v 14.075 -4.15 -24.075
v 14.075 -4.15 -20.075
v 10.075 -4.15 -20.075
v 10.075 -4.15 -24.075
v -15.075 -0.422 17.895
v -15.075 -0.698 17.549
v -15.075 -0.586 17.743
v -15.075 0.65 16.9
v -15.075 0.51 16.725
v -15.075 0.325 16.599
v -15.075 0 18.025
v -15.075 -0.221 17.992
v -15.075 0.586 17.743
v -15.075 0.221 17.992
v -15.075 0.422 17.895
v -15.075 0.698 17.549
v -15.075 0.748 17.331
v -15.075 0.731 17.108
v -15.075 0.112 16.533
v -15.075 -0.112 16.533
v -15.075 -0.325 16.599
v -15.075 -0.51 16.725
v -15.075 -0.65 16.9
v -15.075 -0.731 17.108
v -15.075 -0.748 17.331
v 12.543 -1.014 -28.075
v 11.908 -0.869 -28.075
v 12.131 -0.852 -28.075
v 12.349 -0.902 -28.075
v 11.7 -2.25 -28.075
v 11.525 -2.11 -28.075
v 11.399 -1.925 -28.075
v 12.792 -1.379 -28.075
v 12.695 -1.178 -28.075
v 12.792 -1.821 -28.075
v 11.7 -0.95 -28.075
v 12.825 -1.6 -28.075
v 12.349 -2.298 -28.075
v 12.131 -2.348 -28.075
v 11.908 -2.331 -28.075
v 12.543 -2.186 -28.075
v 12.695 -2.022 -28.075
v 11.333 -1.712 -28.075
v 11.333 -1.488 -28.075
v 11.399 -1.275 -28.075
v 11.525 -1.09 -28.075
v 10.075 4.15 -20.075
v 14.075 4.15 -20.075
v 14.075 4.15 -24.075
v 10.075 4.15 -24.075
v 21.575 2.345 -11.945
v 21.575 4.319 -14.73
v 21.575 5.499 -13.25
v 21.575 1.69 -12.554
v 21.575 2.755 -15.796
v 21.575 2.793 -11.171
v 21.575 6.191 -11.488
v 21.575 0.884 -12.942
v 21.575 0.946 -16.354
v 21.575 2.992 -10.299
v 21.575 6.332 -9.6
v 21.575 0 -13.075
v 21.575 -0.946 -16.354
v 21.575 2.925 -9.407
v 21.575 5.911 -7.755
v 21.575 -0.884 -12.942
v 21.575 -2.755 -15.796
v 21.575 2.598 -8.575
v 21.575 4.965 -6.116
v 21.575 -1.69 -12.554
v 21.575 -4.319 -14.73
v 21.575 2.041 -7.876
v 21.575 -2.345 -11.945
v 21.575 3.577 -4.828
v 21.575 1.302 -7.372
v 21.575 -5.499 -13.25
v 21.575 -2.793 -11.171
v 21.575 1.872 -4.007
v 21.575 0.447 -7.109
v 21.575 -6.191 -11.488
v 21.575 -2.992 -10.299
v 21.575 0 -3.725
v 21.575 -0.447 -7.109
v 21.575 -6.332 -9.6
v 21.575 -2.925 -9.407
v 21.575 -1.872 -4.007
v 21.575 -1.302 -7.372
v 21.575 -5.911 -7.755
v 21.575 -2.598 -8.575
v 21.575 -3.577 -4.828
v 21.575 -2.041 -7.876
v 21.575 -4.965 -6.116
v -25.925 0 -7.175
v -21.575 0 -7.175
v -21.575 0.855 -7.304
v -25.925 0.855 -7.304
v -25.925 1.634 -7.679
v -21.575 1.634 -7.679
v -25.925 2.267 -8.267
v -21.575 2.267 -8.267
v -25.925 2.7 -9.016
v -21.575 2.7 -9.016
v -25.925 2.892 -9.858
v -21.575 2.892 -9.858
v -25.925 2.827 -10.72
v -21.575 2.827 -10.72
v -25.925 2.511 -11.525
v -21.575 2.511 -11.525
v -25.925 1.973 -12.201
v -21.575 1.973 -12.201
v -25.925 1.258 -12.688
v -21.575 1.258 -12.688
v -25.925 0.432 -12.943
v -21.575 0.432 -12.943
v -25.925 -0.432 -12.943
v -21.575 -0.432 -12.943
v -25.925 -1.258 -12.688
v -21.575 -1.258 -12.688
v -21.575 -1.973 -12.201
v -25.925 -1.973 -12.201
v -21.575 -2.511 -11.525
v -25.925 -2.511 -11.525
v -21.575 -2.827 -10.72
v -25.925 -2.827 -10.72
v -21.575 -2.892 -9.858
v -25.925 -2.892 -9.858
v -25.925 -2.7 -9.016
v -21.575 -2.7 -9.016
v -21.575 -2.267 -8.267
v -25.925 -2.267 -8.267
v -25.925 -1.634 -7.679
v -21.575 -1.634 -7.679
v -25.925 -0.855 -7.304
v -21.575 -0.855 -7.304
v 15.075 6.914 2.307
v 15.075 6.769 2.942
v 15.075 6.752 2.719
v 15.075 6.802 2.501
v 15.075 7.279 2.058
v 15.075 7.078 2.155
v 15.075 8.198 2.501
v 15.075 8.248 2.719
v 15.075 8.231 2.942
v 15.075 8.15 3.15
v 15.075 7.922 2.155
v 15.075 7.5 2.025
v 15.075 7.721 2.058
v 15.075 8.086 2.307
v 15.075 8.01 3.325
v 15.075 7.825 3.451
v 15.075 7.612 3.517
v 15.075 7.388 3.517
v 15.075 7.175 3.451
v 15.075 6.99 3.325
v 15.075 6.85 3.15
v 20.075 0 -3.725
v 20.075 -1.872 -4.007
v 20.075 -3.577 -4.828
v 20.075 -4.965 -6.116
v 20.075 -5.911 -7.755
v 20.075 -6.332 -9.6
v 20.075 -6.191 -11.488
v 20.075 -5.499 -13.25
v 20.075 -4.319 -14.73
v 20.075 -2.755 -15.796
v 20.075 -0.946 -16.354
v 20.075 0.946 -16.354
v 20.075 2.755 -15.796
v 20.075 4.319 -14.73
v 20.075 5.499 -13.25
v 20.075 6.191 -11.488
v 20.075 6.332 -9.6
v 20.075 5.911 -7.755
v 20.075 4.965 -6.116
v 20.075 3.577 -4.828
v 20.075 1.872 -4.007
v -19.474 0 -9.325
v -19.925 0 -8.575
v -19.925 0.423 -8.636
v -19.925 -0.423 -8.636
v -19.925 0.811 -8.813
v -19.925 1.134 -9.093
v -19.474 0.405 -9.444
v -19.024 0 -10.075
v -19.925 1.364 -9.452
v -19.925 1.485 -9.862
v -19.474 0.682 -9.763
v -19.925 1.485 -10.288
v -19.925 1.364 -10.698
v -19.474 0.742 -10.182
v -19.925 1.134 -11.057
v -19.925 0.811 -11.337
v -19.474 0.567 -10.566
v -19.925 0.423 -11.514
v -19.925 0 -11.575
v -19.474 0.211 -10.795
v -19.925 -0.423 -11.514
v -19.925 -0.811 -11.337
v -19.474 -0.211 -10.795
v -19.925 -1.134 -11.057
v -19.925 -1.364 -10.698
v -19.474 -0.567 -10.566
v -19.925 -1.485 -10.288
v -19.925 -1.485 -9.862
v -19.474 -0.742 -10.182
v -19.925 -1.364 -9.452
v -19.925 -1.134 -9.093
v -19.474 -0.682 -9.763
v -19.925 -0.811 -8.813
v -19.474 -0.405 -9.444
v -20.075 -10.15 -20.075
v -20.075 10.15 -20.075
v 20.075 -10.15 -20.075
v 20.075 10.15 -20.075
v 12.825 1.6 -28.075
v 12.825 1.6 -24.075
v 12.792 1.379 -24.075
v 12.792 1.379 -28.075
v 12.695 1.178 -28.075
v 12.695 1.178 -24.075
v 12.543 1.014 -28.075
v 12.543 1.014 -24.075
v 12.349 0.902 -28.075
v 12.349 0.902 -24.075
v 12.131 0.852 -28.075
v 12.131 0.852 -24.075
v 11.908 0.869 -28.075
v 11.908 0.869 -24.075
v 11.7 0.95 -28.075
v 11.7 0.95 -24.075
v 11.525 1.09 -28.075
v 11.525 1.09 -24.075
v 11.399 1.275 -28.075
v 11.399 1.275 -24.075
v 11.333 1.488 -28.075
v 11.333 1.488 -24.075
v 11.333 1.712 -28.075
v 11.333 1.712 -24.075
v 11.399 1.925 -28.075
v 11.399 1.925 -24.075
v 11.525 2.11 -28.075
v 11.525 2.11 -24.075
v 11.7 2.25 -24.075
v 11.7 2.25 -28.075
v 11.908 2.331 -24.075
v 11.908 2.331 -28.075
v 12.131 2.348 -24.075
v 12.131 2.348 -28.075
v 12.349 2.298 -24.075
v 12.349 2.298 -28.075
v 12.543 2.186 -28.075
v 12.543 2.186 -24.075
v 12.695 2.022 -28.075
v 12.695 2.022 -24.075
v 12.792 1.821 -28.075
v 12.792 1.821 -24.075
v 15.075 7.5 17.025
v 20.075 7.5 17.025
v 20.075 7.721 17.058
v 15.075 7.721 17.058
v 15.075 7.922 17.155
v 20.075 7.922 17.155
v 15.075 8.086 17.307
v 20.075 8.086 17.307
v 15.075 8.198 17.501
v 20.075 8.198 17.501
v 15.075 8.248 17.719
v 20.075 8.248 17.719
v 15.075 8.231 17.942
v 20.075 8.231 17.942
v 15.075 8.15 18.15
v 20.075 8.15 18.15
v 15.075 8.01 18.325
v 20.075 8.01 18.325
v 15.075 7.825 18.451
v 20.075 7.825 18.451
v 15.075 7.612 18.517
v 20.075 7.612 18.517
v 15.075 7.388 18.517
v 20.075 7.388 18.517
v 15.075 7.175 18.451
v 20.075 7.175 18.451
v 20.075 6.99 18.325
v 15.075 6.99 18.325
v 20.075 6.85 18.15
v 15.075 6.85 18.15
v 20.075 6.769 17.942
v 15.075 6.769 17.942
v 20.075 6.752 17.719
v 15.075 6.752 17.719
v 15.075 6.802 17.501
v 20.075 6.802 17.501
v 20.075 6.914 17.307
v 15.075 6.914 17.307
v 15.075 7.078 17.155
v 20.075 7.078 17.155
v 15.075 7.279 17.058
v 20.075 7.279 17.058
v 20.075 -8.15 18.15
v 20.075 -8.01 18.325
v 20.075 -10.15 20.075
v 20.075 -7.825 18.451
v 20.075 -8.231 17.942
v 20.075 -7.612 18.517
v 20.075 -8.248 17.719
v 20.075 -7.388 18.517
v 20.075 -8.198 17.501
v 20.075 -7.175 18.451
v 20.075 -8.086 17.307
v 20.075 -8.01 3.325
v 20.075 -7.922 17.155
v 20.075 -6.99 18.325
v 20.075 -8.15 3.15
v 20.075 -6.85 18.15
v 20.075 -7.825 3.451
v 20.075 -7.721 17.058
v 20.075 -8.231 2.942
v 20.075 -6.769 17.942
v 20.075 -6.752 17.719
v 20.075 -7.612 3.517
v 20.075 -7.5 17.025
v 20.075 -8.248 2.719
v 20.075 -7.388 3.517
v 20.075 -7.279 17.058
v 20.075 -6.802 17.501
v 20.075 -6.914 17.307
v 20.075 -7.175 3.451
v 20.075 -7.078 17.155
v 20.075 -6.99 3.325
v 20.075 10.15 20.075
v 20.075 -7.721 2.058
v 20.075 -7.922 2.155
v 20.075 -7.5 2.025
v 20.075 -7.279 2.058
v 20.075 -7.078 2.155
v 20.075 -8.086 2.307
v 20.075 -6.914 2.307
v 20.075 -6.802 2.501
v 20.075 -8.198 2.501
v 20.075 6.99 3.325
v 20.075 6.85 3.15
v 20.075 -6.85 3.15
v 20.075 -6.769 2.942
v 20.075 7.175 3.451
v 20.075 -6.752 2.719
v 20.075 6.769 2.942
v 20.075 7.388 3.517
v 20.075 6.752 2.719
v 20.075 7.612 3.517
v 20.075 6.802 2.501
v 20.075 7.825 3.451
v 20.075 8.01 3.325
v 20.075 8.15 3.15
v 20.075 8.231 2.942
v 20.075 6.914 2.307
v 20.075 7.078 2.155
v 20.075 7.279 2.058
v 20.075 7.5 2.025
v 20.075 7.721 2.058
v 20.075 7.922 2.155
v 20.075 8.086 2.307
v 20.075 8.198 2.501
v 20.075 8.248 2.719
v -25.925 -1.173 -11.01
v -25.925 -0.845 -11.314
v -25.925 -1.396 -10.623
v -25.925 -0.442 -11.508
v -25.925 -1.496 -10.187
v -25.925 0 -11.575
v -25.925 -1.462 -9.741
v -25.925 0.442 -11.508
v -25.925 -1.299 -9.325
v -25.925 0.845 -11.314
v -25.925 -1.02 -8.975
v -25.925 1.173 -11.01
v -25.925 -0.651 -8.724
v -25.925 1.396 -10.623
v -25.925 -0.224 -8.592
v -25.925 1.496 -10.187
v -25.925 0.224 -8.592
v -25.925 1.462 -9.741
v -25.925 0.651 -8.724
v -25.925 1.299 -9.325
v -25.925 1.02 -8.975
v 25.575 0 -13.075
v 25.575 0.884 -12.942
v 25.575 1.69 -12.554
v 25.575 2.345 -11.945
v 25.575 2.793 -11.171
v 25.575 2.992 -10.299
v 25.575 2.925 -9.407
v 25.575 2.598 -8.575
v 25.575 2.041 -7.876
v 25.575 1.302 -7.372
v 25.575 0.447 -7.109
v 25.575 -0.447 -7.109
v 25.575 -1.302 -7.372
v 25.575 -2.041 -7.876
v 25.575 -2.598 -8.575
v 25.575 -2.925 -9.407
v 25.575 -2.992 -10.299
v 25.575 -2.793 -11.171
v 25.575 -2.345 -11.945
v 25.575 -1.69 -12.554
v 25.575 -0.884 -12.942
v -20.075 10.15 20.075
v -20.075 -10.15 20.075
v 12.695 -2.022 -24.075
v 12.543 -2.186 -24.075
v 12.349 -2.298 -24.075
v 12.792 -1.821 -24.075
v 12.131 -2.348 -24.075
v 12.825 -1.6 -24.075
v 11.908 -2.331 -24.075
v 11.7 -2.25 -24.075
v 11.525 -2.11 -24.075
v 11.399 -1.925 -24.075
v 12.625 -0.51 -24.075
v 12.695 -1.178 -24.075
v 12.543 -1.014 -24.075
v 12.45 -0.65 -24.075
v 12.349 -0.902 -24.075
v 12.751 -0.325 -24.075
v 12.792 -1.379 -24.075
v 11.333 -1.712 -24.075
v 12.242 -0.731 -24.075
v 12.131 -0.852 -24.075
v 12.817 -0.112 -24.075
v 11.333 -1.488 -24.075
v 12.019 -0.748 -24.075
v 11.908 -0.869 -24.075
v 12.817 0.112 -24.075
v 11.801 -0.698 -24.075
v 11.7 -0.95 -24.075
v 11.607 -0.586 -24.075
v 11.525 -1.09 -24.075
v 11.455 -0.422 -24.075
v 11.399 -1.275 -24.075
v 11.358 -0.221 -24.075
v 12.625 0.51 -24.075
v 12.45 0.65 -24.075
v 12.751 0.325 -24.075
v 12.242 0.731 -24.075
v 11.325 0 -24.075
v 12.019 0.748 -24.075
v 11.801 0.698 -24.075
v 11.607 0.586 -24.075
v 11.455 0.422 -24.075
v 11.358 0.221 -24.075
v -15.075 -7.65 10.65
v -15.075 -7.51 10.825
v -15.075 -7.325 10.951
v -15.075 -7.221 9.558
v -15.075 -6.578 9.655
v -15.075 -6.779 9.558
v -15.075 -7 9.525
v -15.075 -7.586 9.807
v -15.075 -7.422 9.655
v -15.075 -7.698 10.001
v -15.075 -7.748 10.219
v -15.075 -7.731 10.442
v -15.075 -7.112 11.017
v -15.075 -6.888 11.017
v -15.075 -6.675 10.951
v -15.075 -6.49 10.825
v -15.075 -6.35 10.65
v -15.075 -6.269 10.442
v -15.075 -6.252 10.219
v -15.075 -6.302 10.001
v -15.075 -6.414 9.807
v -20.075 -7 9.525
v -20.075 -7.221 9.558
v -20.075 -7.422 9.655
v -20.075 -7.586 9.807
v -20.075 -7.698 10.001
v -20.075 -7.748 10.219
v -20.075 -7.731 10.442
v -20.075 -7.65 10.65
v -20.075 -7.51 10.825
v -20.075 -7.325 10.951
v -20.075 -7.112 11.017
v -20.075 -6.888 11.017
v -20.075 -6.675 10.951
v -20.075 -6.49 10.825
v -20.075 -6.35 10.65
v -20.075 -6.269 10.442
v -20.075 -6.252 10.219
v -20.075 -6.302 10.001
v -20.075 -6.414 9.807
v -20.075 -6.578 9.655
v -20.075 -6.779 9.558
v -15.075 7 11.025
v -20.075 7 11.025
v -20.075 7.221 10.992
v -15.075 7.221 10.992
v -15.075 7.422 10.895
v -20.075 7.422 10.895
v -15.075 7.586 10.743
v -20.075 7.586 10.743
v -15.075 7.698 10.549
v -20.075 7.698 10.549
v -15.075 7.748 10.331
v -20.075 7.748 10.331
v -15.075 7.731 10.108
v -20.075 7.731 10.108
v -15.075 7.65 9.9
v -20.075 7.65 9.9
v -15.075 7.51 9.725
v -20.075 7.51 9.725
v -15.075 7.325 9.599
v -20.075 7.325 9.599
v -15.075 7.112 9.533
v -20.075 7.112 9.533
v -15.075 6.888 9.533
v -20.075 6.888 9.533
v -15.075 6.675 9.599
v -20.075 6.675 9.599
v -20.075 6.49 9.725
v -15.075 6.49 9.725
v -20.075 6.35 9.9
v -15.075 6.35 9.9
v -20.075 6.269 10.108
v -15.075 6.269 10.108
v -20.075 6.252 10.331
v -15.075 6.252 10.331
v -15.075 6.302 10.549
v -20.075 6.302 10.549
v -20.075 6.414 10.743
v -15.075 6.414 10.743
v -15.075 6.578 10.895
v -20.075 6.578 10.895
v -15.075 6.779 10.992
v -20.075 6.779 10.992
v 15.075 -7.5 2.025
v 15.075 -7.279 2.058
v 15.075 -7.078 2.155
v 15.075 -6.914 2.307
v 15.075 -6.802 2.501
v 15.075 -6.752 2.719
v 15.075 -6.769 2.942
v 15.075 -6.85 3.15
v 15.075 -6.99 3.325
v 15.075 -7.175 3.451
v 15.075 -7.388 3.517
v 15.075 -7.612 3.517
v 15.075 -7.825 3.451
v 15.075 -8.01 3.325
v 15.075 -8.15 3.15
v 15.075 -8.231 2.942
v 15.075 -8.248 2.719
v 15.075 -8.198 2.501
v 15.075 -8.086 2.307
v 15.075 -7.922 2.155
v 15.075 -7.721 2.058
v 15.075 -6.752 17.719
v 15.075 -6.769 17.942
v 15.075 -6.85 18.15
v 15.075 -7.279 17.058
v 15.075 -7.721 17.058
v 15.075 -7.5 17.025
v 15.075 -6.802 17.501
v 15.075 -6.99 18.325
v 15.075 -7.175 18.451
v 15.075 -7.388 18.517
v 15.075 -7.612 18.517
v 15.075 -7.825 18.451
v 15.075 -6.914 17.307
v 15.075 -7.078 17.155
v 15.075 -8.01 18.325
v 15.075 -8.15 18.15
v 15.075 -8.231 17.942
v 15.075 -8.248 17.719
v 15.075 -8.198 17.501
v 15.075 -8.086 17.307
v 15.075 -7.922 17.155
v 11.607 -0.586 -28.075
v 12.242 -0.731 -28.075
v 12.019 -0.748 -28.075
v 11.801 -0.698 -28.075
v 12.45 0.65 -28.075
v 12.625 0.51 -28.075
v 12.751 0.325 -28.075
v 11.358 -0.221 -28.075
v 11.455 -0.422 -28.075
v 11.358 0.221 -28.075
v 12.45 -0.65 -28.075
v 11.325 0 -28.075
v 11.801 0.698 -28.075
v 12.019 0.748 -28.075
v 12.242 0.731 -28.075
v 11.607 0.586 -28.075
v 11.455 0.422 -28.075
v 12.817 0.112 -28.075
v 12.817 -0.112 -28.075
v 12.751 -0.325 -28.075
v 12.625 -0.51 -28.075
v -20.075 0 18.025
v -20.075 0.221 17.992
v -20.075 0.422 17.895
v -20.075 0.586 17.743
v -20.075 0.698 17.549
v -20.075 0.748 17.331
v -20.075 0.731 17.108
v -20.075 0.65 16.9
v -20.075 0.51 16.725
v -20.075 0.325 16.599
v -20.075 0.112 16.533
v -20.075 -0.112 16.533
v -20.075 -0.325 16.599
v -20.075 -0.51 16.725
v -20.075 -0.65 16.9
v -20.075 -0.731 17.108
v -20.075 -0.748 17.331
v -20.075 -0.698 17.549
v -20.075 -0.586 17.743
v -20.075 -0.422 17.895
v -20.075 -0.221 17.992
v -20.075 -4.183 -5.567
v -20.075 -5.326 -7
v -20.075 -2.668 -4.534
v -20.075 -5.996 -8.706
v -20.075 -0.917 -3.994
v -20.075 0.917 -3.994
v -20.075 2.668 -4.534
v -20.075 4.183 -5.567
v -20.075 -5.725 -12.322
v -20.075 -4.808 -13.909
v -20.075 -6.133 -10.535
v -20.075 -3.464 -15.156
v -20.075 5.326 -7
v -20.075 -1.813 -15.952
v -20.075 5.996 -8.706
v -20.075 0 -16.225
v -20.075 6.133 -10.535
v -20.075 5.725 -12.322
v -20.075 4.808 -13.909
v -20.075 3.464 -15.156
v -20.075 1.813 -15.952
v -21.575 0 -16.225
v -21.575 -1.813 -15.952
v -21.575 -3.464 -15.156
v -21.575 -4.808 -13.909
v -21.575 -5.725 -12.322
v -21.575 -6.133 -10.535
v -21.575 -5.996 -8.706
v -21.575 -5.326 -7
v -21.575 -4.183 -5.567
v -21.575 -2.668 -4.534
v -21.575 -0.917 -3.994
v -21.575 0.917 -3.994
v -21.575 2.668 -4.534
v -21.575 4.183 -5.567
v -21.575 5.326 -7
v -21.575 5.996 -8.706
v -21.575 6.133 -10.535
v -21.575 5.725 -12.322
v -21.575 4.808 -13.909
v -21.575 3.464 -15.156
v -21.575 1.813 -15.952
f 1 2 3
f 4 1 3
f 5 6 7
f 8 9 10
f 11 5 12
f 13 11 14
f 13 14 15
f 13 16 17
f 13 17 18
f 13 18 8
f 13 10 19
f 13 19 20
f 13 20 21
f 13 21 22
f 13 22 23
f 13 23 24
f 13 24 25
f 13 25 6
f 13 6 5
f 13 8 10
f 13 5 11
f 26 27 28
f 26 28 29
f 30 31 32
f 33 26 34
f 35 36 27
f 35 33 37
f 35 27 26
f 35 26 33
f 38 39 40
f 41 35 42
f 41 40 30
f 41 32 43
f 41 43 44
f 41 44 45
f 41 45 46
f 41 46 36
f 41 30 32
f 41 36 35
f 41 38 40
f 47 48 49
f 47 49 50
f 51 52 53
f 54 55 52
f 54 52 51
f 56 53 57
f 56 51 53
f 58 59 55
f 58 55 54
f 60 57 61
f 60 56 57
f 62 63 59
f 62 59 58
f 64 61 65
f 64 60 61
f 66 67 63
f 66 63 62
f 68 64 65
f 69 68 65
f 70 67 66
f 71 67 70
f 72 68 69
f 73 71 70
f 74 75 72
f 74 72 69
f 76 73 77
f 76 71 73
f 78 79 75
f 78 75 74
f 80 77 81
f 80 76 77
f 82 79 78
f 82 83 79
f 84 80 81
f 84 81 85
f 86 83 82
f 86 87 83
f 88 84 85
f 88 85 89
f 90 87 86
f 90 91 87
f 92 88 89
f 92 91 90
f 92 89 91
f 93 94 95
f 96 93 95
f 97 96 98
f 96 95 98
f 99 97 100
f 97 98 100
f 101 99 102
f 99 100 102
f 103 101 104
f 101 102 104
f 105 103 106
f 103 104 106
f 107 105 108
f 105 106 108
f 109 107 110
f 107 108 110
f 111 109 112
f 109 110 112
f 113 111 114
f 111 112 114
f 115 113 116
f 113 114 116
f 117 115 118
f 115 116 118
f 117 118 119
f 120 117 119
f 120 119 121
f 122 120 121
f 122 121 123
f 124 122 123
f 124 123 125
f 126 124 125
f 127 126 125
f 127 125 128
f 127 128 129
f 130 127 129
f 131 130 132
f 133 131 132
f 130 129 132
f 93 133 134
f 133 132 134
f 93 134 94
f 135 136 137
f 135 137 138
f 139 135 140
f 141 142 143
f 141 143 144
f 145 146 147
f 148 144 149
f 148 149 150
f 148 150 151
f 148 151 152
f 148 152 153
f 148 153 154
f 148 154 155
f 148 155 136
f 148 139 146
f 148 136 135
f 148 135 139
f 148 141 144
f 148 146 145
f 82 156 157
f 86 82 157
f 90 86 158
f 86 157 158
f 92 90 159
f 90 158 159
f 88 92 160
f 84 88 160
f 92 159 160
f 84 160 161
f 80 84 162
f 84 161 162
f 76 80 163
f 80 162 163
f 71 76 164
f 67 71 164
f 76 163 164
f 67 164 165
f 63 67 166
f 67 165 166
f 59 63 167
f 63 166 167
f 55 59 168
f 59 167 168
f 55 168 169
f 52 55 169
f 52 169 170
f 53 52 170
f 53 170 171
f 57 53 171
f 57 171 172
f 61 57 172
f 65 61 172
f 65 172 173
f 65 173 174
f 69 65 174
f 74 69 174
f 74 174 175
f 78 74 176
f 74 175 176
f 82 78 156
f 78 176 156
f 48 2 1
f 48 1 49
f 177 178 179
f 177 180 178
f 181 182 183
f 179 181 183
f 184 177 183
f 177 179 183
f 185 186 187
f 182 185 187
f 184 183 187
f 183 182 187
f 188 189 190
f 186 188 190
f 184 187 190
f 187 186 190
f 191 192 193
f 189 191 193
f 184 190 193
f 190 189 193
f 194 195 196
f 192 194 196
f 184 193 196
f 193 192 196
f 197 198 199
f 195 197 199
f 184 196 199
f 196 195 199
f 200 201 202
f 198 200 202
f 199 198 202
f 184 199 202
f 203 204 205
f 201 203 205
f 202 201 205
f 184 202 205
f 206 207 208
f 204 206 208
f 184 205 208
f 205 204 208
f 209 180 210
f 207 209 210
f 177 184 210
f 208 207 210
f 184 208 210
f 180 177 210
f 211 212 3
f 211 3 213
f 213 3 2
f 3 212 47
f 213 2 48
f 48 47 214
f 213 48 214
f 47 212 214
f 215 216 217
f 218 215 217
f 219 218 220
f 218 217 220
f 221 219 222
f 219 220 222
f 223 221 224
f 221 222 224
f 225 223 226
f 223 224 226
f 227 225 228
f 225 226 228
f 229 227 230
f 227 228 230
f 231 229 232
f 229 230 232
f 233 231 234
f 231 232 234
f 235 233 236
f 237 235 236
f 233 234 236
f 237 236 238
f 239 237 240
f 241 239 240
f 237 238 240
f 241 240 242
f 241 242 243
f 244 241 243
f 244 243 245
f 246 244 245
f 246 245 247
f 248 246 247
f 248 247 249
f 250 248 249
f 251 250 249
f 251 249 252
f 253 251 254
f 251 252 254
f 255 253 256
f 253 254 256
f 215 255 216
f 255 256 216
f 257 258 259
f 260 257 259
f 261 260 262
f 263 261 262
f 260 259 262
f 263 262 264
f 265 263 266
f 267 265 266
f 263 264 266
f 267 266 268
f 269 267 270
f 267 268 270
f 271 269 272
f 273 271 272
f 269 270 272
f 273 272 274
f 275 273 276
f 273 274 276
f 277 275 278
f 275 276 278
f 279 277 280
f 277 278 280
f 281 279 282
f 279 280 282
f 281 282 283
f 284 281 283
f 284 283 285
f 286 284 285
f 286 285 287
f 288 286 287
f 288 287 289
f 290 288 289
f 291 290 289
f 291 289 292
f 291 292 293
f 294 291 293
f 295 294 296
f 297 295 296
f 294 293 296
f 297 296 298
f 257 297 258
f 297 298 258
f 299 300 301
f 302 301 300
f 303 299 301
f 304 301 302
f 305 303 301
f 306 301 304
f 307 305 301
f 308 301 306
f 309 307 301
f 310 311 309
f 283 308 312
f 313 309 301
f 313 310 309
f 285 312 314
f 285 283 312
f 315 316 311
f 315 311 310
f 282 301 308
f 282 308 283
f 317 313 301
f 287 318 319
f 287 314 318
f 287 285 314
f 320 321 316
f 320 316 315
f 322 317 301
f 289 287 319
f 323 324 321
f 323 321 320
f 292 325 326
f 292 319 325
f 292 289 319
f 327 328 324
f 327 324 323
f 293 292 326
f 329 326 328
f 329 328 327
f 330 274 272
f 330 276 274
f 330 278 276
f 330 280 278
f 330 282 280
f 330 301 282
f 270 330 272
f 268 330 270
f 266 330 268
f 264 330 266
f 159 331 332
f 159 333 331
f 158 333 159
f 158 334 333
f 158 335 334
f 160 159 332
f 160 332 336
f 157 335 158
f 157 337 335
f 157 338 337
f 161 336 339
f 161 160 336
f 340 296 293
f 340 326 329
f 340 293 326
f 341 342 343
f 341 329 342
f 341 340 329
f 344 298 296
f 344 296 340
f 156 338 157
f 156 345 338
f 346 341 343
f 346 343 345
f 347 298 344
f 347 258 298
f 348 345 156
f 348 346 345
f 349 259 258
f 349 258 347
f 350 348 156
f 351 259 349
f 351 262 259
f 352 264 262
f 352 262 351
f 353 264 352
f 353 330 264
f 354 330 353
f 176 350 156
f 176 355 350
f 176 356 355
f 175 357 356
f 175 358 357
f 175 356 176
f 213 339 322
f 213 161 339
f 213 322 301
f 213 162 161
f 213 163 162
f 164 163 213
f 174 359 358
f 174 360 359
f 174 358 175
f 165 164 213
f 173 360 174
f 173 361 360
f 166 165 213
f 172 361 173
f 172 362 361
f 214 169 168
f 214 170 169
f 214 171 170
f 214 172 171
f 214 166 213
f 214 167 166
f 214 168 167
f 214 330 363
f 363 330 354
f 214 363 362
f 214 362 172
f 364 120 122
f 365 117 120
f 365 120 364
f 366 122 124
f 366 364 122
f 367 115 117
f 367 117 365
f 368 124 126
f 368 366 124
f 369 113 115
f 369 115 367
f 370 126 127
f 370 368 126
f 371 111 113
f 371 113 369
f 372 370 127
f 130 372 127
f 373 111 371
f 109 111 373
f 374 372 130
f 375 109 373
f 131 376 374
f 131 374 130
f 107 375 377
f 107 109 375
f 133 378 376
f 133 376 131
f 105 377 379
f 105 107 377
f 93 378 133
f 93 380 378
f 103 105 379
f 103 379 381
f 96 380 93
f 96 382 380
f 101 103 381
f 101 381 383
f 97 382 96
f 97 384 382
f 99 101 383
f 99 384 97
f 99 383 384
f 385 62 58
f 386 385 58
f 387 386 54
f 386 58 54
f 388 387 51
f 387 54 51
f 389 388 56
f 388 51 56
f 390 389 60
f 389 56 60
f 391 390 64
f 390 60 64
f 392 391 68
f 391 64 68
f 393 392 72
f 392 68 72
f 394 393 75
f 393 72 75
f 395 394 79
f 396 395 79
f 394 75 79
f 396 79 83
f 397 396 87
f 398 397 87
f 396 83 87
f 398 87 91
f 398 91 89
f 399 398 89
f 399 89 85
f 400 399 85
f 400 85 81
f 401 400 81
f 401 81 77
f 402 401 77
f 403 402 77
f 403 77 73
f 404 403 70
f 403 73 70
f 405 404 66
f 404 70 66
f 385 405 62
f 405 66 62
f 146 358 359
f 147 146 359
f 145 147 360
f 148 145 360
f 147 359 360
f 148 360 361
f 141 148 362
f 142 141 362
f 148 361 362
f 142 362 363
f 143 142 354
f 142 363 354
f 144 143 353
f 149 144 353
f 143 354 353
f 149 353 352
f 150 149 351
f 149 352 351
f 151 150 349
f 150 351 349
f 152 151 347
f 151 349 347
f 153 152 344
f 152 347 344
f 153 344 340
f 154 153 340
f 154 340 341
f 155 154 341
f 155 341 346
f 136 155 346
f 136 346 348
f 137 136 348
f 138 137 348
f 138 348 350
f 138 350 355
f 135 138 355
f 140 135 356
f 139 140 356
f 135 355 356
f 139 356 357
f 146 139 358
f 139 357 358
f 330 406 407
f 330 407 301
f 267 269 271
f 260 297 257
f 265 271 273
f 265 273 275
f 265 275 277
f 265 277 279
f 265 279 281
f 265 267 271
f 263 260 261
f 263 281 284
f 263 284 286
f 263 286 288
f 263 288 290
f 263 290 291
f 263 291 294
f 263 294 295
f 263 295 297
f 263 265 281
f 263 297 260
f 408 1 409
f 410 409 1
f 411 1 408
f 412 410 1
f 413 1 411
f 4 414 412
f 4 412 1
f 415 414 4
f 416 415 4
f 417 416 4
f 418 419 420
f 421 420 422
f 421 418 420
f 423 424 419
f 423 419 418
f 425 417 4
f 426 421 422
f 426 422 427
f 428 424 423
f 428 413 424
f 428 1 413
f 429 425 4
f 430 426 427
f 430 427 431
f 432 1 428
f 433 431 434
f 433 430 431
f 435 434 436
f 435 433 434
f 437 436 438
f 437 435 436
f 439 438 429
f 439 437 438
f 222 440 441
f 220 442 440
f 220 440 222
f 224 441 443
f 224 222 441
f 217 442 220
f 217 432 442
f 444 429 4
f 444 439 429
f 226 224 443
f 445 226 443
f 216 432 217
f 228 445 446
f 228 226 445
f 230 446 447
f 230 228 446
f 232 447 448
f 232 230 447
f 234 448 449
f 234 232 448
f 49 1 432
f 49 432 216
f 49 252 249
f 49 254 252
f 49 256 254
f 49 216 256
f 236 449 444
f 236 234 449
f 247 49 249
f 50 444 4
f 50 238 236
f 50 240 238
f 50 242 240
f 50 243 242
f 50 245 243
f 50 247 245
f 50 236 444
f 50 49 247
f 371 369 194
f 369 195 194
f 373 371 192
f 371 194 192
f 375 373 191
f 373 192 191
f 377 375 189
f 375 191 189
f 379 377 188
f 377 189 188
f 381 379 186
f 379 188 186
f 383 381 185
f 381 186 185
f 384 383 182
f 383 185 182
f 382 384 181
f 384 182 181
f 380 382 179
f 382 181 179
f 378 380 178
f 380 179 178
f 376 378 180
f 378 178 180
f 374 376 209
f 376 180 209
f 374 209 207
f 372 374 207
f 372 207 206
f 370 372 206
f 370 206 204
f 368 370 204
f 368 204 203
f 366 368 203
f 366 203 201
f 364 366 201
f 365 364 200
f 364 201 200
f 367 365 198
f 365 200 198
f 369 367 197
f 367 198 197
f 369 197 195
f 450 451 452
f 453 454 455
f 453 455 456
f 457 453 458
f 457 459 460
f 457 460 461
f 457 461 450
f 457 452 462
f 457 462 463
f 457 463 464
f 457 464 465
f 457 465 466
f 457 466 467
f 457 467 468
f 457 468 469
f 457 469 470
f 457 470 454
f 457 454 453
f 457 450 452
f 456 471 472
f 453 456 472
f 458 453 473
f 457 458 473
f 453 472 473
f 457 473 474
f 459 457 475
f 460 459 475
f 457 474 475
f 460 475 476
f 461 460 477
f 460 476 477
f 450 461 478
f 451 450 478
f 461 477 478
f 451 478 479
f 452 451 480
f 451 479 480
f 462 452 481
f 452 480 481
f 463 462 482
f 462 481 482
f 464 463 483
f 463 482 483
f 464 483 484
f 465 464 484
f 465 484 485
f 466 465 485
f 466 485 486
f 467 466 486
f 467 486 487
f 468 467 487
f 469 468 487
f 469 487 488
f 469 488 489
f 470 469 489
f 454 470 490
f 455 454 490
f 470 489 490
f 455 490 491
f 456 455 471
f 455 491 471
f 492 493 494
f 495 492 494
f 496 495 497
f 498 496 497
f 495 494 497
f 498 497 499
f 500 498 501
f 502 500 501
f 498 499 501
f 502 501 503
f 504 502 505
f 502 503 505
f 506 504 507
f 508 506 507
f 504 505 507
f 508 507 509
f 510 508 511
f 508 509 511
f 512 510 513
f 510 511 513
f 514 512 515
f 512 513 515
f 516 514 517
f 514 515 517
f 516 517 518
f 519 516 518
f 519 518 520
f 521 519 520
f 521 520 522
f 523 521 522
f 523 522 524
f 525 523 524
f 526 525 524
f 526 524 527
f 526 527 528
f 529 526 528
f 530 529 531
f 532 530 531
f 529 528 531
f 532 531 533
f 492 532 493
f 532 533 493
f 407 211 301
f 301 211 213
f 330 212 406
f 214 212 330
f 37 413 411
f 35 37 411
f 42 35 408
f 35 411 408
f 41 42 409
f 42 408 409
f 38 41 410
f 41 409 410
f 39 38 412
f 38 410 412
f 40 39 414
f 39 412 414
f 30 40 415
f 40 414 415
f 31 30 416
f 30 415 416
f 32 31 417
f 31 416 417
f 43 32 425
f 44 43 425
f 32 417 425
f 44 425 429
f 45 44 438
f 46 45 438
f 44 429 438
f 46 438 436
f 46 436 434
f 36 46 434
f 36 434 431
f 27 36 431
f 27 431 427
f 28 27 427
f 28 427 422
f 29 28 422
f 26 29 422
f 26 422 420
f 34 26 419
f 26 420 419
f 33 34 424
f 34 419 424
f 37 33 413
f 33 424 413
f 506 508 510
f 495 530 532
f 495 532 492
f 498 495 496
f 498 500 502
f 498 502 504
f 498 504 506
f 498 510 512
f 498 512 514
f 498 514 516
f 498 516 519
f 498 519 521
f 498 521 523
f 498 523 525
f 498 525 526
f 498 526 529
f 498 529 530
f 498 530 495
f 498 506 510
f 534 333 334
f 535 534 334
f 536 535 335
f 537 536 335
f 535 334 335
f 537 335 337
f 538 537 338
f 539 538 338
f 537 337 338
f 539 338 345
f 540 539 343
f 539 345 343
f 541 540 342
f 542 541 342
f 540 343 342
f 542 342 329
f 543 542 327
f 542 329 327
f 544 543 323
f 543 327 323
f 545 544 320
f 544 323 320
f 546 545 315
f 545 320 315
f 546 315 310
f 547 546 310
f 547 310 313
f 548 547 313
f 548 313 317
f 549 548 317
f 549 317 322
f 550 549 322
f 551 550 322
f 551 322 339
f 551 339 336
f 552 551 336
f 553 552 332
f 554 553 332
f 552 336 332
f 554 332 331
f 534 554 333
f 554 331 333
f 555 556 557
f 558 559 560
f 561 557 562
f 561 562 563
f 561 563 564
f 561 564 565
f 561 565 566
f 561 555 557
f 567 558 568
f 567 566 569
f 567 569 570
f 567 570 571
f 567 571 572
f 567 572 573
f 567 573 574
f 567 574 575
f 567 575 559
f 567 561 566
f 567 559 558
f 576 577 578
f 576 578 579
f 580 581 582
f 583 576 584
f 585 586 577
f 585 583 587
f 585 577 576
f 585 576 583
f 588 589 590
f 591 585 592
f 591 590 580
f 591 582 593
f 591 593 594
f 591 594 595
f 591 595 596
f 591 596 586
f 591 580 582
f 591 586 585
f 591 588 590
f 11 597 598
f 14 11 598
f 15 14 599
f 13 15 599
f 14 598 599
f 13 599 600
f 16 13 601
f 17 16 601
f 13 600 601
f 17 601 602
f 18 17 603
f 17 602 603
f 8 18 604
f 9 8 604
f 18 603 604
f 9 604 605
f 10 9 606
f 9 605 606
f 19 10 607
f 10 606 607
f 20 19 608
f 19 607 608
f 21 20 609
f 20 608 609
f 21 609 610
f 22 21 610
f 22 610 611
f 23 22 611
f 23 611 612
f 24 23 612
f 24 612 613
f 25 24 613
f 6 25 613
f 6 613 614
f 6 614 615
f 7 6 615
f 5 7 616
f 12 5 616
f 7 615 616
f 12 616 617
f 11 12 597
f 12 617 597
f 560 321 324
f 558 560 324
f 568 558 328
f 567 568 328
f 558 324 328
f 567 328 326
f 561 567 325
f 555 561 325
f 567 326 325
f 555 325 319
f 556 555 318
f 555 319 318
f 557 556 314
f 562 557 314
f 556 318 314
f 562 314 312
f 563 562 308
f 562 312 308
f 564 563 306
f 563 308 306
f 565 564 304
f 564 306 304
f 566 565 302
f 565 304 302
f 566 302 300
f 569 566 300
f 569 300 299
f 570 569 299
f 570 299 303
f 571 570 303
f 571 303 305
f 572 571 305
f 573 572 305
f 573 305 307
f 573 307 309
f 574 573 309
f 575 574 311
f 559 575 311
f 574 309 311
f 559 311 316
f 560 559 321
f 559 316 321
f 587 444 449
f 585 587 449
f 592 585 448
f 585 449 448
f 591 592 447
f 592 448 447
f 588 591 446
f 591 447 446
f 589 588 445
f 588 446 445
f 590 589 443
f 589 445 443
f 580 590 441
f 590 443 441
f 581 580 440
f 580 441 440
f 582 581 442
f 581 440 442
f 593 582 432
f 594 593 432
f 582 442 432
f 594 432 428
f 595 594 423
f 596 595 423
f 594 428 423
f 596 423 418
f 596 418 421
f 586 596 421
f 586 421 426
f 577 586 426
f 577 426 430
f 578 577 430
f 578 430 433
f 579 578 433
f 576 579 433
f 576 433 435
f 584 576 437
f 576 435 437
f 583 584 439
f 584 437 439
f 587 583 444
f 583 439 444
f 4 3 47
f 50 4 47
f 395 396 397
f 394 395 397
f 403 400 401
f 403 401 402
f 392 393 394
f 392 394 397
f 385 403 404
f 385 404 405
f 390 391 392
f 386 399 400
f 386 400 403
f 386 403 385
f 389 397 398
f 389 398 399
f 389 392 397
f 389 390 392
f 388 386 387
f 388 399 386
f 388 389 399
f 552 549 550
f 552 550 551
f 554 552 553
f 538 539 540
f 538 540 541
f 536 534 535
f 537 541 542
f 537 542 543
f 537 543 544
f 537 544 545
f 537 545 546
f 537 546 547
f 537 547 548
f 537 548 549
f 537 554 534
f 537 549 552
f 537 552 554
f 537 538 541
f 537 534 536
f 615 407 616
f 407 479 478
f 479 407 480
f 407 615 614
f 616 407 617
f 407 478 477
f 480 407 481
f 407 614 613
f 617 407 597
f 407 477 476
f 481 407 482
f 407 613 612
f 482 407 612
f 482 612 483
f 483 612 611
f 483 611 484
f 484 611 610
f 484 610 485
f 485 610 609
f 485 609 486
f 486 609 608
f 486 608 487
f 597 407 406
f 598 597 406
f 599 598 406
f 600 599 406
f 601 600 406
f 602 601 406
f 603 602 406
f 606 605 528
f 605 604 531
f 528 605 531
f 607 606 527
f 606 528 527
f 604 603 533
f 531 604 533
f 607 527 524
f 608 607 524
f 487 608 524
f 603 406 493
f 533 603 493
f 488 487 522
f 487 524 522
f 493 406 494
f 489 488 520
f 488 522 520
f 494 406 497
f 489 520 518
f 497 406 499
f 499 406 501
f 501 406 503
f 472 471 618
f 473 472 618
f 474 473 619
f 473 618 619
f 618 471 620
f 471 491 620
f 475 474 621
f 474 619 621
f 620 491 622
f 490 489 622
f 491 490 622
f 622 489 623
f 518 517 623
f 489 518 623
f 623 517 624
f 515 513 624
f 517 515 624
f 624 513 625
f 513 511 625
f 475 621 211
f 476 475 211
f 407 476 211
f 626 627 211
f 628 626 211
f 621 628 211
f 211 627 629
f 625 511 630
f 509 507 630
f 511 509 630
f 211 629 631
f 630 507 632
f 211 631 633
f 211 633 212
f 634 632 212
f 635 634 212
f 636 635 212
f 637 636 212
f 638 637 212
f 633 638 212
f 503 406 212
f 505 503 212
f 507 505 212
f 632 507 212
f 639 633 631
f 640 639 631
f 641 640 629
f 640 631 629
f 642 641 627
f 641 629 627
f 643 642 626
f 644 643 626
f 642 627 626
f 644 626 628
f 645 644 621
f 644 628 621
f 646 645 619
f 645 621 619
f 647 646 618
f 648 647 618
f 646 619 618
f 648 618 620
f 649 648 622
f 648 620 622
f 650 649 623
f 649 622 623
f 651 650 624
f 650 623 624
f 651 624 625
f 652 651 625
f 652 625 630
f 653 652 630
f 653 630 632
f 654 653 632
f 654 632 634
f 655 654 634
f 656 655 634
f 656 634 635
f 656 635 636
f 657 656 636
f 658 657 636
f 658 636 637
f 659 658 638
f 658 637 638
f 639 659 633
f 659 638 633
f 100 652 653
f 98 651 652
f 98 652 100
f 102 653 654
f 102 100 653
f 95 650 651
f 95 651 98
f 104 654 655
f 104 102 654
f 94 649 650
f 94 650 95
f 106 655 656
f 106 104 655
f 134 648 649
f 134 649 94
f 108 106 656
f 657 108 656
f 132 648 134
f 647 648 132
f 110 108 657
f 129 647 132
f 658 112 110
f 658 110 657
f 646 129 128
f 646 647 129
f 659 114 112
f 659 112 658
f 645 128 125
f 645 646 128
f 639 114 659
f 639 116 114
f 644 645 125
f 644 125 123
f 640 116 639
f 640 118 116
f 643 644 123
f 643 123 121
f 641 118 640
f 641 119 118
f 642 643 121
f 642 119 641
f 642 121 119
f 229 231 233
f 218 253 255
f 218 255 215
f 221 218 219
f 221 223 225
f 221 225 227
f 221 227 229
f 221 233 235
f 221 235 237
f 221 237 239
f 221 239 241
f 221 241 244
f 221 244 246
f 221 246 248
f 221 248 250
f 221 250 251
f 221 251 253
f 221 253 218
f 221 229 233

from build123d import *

# Parameters (mm, degrees)
ESQUISSE1_W                       = 40.15
ESQUISSE1_H                       = 40.15
BOSS_EXTRU_1_DEPTH                = 10.15
ESQUISSE3_R                       = 6.15
BOSS_EXTRU_2_DEPTH                = 1.5
ESQUISSE4_R                       = 2.9
BOSS_EXTRU_3_DEPTH                = 4.35
DIAM_TRE_DU_PER_AGE_3_0_3_1_D     = 3
DIAM_TRE_DU_PER_AGE_3_0_3_1_DEPTH = 6
DIAM_TRE_DU_PER_AGE_3_0_3_1_TIP   = 0.901290929
ESQUISSE5_R                       = 6.35
BOSS_EXTRU_4_DEPTH                = 1.5
ESQUISSE6_R                       = 3
BOSS_EXTRU_5_DEPTH                = 4
ESQUISSE7_W                       = 4
ESQUISSE7_H                       = 8.3
BOSS_EXTRU_6_DEPTH                = 4
ESQUISSE8_R                       = 0.75
BOSS_EXTRU_8_DEPTH                = 4
ESQUISSE9_R                       = 0.75
ENL_V_MAT_EXTRU_1_DEPTH           = 5
ESQUISSE10_R                      = 0.75
ENL_V_MAT_EXTRU_2_DEPTH           = 5


with BuildPart() as part:
    # Esquisse1 → Boss.-Extru.1 (new, symmetric)
    with BuildSketch(Plane(origin=(0, 0, 0), x_dir=(1, 0, 0), z_dir=(0, 1, 0))):
        Rectangle(ESQUISSE1_W, ESQUISSE1_H)
    extrude(amount=BOSS_EXTRU_1_DEPTH, both=True)

    # Esquisse3 → Boss.-Extru.2 (add)
    with BuildSketch(Plane.ZY.offset(20.075)):
        with Locations((-10.075, 0)):
            Circle(ESQUISSE3_R)
    extrude(amount=BOSS_EXTRU_2_DEPTH)

    # Esquisse4 → Boss.-Extru.3 (add)
    with BuildSketch(Plane.ZY.offset(21.575)):
        with Locations((-10.075, 0)):
            Circle(ESQUISSE4_R)
    extrude(amount=BOSS_EXTRU_3_DEPTH)

    # Diamètre du perçage Ø3.0 (3)1
    with Locations(Plane.ZY.offset(25.925)):
        with Locations((-10.075, 0)):
            Hole(DIAM_TRE_DU_PER_AGE_3_0_3_1_D / 2, depth=DIAM_TRE_DU_PER_AGE_3_0_3_1_DEPTH)
            with Locations((0, 0, -(DIAM_TRE_DU_PER_AGE_3_0_3_1_DEPTH + DIAM_TRE_DU_PER_AGE_3_0_3_1_TIP / 2))):  # 118° drill point
                Cone(0, DIAM_TRE_DU_PER_AGE_3_0_3_1_D / 2, DIAM_TRE_DU_PER_AGE_3_0_3_1_TIP, mode=Mode.SUBTRACT)

    # Esquisse5 → Boss.-Extru.4 (add)
    with BuildSketch(Plane(origin=(20.075, 0, 0), x_dir=(0, 0, -1), z_dir=(1, 0, 0))):
        with Locations((10.075, 0)):
            Circle(ESQUISSE5_R)
    extrude(amount=BOSS_EXTRU_4_DEPTH)

    # Esquisse6 → Boss.-Extru.5 (add)
    with BuildSketch(Plane(origin=(21.575, 0, 0), x_dir=(0, 0, -1), z_dir=(1, 0, 0))):
        with Locations((10.075, 0)):
            Circle(ESQUISSE6_R)
    extrude(amount=BOSS_EXTRU_5_DEPTH)

    # Esquisse7 → Boss.-Extru.6 (add)
    with BuildSketch(Plane(origin=(0, 0, -20.075), x_dir=(-1, 0, 0), z_dir=(0, 0, -1))):
        with Locations((-12.075, 0)):
            Rectangle(ESQUISSE7_W, ESQUISSE7_H)
    extrude(amount=BOSS_EXTRU_6_DEPTH)

    # Esquisse8 → Boss.-Extru.8 (add)
    with BuildSketch(Plane(origin=(0, 0, -24.075), x_dir=(-1, 0, 0), z_dir=(0, 0, -1))):
        with Locations((-12.075, 0)):
            Circle(ESQUISSE8_R)
        with Locations((-12.075, -1.6)):
            Circle(ESQUISSE8_R)
        with Locations((-12.075, 1.6)):
            Circle(ESQUISSE8_R)
    extrude(amount=BOSS_EXTRU_8_DEPTH)

    # Esquisse9 → Enlèv. mat.-Extru.1 (cut)
    with BuildSketch(Plane(origin=(20.075, 0, 0), x_dir=(0, 0, -1), z_dir=(1, 0, 0))):
        with Locations((-17.775, 7.5)):
            Circle(ESQUISSE9_R)
        with Locations((-2.775, 7.5)):
            Circle(ESQUISSE9_R)
        with Locations((-17.775, -7.5)):
            Circle(ESQUISSE9_R)
        with Locations((-2.775, -7.5)):
            Circle(ESQUISSE9_R)
    extrude(amount=-ENL_V_MAT_EXTRU_1_DEPTH, mode=Mode.SUBTRACT)

    # Esquisse10 → Enlèv. mat.-Extru.2 (cut)
    with BuildSketch(Plane.ZY.offset(20.075)):
        with Locations((17.275, 0)):
            Circle(ESQUISSE10_R)
        with Locations((10.275, 7)):
            Circle(ESQUISSE10_R)
        with Locations((10.275, -7)):
            Circle(ESQUISSE10_R)
    extrude(amount=-ENL_V_MAT_EXTRU_2_DEPTH, mode=Mode.SUBTRACT)


solid = part.part
